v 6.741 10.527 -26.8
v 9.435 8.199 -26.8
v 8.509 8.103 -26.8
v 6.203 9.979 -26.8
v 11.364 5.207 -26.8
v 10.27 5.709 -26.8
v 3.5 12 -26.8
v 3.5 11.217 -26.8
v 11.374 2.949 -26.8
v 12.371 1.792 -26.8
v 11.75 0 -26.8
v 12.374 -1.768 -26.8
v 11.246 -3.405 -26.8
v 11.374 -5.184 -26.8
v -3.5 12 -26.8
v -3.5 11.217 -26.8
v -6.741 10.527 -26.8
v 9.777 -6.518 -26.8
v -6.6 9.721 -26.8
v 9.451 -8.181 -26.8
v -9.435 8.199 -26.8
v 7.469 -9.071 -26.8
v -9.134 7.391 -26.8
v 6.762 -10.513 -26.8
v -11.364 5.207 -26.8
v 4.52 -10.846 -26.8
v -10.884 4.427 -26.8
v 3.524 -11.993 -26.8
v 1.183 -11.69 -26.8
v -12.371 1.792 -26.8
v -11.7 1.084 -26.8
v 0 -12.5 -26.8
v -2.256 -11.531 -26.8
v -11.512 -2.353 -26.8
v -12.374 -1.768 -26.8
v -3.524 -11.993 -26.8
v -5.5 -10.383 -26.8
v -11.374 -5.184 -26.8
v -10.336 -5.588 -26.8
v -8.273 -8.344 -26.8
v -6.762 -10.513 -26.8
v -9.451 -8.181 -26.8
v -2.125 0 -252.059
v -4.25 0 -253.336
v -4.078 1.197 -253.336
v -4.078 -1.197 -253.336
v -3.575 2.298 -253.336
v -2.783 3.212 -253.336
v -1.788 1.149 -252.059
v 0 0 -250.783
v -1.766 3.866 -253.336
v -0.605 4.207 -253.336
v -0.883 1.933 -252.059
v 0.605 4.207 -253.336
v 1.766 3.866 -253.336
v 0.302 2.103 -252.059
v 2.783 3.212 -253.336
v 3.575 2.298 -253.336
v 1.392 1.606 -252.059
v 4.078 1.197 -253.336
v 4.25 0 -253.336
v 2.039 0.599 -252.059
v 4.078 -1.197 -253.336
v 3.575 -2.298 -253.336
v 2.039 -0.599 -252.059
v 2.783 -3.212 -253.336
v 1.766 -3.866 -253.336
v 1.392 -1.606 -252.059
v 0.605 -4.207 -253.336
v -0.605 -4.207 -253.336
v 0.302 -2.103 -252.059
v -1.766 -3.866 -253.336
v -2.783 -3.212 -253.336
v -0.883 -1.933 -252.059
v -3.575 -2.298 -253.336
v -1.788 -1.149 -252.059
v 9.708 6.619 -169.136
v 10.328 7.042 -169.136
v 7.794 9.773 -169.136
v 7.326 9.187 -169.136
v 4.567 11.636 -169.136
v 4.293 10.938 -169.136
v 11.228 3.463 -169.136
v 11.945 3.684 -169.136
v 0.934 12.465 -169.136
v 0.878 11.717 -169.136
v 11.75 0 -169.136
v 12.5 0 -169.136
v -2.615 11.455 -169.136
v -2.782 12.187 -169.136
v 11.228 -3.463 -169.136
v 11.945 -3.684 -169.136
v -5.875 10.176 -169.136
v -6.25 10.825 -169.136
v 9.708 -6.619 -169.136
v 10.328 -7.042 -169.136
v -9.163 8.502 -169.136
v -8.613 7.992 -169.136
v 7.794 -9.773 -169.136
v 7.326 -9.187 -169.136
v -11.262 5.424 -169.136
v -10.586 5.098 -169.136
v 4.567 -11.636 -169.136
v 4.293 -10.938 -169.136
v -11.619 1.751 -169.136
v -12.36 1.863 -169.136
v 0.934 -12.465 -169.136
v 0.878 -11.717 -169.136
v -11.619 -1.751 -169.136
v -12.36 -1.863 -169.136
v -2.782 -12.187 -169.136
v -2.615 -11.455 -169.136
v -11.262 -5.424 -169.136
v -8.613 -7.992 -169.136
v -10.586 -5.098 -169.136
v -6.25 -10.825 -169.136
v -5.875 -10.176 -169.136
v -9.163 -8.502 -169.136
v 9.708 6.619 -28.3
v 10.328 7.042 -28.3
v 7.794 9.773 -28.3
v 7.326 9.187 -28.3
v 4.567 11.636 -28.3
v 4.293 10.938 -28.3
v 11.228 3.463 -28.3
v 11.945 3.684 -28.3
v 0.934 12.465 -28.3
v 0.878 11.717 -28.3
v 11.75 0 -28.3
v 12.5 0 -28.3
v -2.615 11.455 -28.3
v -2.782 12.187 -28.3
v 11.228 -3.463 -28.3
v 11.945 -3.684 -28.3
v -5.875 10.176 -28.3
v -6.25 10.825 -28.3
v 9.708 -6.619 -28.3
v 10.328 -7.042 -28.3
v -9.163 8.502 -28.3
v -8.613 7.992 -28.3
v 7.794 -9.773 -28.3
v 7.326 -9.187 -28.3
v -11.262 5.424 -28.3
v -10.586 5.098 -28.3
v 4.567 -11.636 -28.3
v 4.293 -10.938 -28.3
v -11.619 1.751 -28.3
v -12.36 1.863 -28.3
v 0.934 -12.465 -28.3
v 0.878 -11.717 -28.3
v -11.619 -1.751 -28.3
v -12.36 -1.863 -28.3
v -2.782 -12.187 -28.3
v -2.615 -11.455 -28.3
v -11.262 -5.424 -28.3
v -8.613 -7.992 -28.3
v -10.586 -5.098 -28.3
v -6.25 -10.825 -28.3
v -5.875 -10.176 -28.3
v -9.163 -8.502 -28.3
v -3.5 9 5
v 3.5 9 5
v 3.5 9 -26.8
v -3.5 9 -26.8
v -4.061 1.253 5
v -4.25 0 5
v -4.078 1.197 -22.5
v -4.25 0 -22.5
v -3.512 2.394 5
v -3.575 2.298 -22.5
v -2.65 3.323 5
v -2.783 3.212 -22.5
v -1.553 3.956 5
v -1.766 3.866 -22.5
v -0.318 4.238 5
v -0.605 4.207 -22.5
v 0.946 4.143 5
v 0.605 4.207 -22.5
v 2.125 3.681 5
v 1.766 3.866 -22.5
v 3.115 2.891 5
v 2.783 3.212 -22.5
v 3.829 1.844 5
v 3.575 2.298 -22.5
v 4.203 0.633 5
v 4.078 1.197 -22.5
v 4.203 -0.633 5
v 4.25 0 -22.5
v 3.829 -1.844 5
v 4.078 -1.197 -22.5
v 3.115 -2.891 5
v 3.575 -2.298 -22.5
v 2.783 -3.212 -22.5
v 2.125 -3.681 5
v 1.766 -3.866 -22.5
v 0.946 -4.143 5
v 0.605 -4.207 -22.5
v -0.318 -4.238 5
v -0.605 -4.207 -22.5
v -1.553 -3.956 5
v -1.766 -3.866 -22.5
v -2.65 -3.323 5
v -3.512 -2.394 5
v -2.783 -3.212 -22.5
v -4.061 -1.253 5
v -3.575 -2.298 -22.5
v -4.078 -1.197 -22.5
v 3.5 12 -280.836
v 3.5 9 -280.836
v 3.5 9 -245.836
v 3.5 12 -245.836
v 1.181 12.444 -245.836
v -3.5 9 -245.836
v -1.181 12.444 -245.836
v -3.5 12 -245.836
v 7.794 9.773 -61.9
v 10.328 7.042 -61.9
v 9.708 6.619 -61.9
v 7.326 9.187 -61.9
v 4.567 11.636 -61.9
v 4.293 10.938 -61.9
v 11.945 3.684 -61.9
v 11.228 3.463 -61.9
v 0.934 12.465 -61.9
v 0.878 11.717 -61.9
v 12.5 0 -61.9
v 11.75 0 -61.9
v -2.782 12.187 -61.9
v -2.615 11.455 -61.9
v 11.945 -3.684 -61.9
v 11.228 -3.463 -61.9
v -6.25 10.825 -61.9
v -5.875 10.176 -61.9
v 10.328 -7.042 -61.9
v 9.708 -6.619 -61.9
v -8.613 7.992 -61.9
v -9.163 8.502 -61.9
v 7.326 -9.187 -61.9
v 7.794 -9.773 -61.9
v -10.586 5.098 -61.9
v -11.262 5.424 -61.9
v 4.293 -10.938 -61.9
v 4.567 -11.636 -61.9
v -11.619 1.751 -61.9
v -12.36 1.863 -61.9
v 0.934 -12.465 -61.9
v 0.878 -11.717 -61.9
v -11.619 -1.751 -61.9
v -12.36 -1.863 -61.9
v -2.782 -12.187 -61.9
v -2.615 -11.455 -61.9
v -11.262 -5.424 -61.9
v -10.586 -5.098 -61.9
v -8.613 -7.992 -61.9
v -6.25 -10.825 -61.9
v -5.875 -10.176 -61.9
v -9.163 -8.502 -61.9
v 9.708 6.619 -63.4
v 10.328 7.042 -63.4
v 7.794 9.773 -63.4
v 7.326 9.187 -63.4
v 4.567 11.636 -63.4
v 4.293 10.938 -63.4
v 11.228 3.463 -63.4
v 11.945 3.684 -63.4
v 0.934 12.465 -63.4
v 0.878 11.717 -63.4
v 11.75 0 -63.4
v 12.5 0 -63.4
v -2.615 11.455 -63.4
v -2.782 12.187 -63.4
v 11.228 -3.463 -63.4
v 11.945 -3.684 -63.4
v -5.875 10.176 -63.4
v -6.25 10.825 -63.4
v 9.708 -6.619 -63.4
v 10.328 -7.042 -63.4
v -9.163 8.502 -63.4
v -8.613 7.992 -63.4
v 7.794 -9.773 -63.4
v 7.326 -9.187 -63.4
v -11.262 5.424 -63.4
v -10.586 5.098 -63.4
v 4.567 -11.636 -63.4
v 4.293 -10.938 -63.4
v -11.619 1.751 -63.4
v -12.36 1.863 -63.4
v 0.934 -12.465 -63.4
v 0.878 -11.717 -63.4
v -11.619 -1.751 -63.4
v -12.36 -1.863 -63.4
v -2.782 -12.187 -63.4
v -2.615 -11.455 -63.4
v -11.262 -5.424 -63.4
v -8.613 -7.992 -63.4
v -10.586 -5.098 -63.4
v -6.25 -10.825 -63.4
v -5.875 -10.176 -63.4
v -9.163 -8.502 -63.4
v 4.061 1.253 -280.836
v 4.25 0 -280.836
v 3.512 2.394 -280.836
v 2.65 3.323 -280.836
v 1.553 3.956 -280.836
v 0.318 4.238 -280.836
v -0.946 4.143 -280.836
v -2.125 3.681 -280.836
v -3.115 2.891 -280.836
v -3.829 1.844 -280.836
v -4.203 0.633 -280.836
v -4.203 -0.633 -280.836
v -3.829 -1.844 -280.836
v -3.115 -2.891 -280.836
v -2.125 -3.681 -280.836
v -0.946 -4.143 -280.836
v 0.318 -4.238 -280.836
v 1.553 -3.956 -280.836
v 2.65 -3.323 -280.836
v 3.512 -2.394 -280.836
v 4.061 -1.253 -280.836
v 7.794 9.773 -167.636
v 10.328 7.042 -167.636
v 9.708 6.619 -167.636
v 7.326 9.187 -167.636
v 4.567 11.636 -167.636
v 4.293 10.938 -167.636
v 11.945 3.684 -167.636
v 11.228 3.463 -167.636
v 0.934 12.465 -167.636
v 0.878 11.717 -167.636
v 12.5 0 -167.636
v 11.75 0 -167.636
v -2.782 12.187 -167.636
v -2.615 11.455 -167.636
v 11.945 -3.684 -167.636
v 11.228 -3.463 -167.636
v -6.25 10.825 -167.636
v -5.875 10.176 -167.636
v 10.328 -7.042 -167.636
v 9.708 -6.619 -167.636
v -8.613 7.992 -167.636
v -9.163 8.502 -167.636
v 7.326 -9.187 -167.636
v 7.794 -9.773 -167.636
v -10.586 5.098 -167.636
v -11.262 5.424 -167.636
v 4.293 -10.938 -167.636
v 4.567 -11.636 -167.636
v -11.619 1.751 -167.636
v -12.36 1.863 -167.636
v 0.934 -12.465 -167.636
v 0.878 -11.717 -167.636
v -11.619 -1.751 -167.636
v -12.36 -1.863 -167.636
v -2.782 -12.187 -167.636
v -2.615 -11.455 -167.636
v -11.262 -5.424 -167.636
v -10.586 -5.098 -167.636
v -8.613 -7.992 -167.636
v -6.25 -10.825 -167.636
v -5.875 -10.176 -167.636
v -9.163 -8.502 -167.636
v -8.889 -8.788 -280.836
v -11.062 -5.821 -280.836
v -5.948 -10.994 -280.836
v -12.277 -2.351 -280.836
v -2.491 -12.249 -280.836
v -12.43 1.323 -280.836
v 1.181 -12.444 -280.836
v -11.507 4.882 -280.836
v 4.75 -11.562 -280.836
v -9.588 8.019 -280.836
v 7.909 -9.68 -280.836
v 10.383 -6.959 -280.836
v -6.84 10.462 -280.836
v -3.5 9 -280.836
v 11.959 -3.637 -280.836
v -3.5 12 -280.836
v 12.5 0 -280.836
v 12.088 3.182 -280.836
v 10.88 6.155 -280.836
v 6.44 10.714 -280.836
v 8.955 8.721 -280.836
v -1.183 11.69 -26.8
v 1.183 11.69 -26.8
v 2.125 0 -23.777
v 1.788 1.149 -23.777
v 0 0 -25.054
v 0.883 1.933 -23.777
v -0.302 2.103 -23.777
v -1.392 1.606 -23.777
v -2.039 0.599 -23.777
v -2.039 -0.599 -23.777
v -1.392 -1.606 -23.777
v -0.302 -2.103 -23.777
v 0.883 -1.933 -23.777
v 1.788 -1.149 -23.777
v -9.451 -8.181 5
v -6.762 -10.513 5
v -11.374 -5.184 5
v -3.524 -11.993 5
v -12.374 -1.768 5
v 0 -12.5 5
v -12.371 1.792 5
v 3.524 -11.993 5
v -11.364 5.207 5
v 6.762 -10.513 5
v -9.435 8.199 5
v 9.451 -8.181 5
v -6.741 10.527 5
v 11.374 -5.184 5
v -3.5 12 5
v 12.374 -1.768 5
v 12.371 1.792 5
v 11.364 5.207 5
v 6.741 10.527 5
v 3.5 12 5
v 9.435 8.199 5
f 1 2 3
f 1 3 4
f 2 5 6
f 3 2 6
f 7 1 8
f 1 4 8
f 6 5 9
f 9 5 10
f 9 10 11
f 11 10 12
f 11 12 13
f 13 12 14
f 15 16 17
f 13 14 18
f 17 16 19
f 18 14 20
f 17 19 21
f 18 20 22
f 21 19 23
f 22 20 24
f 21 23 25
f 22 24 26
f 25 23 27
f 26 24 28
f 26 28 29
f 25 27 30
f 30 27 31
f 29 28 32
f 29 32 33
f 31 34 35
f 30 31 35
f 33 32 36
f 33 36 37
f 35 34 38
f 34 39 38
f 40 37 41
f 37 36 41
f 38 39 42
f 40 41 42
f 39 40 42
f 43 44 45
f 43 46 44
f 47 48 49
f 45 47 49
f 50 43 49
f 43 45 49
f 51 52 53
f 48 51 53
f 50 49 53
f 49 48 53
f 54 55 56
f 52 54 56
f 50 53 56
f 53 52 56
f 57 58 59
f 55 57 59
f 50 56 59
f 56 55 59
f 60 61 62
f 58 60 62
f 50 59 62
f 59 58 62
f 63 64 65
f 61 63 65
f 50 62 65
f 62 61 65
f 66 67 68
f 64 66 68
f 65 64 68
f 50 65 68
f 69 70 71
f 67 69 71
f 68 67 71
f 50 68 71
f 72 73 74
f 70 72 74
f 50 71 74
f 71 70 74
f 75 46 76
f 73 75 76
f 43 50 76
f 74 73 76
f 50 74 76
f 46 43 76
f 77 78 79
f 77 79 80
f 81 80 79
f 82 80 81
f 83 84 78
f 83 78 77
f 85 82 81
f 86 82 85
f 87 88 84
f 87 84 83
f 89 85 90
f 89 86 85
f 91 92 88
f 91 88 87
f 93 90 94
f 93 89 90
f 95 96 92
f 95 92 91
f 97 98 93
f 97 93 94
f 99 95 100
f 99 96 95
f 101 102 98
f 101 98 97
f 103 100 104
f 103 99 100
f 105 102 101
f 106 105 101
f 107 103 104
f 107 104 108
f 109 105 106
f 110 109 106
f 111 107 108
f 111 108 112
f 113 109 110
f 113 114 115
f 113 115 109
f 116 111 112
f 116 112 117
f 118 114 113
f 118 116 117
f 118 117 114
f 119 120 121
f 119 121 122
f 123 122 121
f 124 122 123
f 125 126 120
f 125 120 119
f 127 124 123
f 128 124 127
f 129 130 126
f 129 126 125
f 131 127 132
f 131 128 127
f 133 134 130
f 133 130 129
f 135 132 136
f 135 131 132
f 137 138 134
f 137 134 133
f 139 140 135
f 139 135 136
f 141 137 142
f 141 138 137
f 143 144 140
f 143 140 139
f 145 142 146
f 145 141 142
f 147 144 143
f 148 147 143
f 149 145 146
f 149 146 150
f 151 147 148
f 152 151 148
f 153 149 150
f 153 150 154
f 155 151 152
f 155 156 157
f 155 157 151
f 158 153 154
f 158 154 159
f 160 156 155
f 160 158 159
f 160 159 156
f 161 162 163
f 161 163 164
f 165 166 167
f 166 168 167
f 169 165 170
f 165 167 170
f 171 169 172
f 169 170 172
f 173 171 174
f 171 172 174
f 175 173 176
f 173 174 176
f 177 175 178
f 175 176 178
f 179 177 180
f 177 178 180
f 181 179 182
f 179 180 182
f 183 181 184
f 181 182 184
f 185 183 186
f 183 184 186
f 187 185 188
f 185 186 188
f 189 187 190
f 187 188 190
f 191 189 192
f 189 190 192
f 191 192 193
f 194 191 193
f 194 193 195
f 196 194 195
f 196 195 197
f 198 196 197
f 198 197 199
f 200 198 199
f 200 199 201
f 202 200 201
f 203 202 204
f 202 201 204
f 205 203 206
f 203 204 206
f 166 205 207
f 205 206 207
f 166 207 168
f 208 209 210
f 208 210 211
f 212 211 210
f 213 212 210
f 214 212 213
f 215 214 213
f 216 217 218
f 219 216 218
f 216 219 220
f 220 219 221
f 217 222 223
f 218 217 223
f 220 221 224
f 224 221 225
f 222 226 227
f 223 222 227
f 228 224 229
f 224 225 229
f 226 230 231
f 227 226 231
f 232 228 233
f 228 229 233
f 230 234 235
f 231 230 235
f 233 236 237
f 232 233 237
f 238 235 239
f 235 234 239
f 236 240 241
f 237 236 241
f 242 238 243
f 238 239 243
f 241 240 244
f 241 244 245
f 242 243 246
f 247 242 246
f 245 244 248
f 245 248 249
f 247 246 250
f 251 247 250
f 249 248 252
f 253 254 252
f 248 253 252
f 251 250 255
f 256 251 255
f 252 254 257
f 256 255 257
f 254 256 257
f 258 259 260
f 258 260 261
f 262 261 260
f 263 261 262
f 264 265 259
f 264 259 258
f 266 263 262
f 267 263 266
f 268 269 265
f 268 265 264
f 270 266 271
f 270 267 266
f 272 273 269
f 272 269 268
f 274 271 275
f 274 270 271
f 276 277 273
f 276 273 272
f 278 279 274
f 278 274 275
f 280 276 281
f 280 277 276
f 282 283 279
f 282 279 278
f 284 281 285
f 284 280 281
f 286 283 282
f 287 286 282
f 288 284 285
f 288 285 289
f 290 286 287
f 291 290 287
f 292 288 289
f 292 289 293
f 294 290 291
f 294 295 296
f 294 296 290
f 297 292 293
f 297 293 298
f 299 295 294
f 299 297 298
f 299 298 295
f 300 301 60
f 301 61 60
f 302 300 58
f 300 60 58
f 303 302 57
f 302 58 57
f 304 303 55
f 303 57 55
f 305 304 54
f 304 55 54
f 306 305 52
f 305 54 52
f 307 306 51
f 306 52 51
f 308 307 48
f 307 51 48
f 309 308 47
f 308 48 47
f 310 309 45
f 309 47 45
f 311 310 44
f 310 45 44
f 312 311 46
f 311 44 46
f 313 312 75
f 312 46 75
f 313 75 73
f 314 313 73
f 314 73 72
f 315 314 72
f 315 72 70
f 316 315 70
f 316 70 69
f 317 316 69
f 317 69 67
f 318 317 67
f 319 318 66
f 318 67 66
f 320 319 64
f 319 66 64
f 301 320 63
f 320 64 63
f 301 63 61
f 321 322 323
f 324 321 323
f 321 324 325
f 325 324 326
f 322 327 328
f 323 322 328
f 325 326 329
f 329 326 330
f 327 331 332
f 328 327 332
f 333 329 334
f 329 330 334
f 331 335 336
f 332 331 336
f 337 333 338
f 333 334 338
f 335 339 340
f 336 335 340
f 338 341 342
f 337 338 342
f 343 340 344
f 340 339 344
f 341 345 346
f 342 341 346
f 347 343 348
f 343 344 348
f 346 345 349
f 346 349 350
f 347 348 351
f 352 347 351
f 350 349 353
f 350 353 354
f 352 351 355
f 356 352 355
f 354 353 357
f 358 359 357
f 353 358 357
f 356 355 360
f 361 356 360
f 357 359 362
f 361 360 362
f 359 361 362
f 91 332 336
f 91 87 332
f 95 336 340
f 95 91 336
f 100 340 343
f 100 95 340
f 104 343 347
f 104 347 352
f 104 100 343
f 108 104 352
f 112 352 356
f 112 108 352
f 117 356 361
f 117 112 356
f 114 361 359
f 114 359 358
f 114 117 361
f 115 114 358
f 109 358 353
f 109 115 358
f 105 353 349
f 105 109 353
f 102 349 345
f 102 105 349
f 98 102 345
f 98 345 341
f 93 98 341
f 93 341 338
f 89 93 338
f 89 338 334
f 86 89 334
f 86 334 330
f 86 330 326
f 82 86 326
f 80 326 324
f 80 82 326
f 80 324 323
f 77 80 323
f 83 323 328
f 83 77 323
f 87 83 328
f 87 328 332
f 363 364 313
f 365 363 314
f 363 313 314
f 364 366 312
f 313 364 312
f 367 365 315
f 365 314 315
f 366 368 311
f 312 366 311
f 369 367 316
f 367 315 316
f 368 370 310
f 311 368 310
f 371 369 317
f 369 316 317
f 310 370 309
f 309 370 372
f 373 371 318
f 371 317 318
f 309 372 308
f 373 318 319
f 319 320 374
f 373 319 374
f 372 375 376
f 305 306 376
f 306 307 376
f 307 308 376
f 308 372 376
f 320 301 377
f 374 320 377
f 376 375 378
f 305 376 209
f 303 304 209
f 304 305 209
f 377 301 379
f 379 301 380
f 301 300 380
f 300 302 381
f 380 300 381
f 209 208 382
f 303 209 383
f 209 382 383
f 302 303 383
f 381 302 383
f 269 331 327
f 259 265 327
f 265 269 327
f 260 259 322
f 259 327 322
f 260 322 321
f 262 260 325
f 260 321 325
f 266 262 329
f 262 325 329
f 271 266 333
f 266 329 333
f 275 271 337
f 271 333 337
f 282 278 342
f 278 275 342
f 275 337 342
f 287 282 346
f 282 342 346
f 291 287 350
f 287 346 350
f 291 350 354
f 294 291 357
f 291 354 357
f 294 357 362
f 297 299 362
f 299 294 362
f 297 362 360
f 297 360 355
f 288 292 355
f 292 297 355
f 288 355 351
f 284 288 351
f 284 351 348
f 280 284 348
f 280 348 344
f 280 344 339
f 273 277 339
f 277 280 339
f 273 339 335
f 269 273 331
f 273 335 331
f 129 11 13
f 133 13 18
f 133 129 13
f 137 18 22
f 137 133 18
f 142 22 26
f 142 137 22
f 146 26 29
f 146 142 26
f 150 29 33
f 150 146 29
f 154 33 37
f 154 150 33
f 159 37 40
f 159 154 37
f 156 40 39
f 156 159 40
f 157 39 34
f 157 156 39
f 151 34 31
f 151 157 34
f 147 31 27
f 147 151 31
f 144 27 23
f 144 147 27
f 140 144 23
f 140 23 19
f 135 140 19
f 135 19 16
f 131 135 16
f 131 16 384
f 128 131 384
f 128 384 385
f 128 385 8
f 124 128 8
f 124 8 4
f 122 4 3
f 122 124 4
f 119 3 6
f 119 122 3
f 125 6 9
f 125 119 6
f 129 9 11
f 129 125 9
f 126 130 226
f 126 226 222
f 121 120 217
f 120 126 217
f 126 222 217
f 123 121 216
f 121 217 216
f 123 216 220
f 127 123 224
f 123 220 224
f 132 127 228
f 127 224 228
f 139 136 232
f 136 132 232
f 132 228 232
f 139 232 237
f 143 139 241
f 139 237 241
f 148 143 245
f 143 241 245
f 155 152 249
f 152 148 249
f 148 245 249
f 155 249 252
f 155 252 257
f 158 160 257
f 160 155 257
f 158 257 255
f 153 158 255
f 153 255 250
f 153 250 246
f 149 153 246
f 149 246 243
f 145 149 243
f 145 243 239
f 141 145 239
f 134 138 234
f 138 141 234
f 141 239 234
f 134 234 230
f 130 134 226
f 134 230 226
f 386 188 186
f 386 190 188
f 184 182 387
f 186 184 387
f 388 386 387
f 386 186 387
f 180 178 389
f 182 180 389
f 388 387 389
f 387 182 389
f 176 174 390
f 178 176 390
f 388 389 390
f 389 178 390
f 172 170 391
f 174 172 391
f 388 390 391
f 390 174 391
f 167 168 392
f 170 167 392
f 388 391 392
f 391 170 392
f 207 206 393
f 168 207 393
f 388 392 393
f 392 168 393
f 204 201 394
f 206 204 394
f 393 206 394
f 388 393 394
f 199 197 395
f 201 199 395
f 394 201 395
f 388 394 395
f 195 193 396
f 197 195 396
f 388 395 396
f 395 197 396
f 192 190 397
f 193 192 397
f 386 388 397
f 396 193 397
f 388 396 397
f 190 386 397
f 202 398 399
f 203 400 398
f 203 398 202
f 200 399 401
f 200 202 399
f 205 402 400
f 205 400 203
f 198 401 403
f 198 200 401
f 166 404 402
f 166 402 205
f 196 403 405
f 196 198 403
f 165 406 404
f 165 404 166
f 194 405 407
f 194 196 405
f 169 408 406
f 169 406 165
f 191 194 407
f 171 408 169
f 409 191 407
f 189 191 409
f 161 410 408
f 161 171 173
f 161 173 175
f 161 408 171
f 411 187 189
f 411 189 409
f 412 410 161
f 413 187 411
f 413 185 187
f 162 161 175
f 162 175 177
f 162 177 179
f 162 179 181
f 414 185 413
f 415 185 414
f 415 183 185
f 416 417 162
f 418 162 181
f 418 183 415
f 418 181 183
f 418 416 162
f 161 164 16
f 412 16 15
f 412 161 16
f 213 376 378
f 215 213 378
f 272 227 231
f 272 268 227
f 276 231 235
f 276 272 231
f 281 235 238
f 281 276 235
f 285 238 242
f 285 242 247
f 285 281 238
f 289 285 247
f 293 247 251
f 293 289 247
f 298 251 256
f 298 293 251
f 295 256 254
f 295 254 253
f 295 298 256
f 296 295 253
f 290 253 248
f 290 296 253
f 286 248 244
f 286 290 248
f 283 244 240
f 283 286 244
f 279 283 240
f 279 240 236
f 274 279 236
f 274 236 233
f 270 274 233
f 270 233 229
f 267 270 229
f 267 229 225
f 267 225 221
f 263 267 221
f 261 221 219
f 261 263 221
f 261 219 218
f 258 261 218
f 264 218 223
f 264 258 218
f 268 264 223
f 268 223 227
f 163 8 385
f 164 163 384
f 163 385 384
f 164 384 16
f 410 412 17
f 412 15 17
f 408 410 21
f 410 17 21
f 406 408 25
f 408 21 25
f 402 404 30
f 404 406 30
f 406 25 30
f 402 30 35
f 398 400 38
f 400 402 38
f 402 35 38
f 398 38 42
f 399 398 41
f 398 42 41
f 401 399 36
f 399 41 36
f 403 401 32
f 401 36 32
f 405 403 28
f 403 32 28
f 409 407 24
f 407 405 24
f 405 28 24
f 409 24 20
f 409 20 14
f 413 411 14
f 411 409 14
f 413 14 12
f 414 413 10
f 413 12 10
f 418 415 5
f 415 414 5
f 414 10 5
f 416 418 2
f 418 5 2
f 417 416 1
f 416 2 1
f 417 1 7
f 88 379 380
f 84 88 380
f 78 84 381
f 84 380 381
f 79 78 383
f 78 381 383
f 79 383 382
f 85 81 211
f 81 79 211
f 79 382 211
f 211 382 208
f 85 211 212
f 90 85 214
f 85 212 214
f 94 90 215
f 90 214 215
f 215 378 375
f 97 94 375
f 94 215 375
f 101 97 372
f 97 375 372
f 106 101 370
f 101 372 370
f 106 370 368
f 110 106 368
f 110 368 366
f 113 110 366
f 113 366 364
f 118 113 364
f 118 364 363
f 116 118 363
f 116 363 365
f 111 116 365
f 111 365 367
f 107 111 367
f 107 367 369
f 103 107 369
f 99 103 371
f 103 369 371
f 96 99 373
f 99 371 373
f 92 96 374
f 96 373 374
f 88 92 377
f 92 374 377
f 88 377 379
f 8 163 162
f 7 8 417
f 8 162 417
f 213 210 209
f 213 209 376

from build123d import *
from OCP.BRepAlgoAPI import BRepAlgoAPI_Cut
from OCP.TopTools import TopTools_ListOfShape

# Parameters (mm, degrees)
EXTRUDE_1_DEPTH        = 5
EXTRUDE_1_DEPTH_BACK   = 280.836309
SKETCH_1_R             = 12.5
HOLE_WIZARD_M101_D     = 8.5
HOLE_WIZARD_M101_DEPTH = 27.5
HOLE_WIZARD_M101_TIP   = 2.553657631
SKETCH_6_W             = 7
SKETCH_6_H             = 7
CUT_EXTRUDE_1_DEPTH    = 35
SKETCH_7_W             = 1.5
SKETCH_7_H             = 2.75
CUT_EXTRUDE_START      = -285.836309
SKETCH_6_2_W           = 7
SKETCH_6_2_H           = 7
CUT_EXTRUDE_2_DEPTH    = 31.8
HOLE_WIZARD_M102_D     = 8.5
HOLE_WIZARD_M102_DEPTH = 27.5
HOLE_WIZARD_M102_TIP   = 2.553657631


with BuildPart() as part:
    # Эскиз1 → Бобышка-Вытянуть1 (new, two sides: drawn at the far end of the back side and taken through both)
    with BuildSketch(Plane.XY.offset(-EXTRUDE_1_DEPTH_BACK)):
        Circle(SKETCH_1_R)
    extrude(amount=EXTRUDE_1_DEPTH + EXTRUDE_1_DEPTH_BACK)

    # Отверстие обработанное метчиком M101
    with Locations(Plane(origin=(0, 0, -280.836309448), x_dir=(-1, 0, 0), z_dir=(0, 0, -1))):
        with Locations((0, 0)):
            Hole(HOLE_WIZARD_M101_D / 2, depth=HOLE_WIZARD_M101_DEPTH)
            with Locations((0, 0, -(HOLE_WIZARD_M101_DEPTH + HOLE_WIZARD_M101_TIP / 2))):  # 118° drill point
                Cone(0, HOLE_WIZARD_M101_D / 2, HOLE_WIZARD_M101_TIP, mode=Mode.SUBTRACT)

    # Эскиз6 → Вырез-Вытянуть1 (cut)
    with BuildSketch(Plane(origin=(0, 0, -280.836309448), x_dir=(-1, 0, 0), z_dir=(0, 0, -1))):
        with Locations((0, 12.5)):
            Rectangle(SKETCH_6_W, SKETCH_6_H)
    extrude(amount=-CUT_EXTRUDE_1_DEPTH, mode=Mode.SUBTRACT)

    # Эскиз7 → Вырез-Повернуть1 (revolve, cut)
    with BuildSketch(Plane(origin=(0, 0, 0), x_dir=(0, 0, -1), z_dir=(1, 0, 0)), mode=Mode.PRIVATE) as cut_revolve_1_sk:
        with Locations((62.65, 13.125)):
            Rectangle(SKETCH_7_W, SKETCH_7_H)
        with Locations((27.55, 13.125)):
            Rectangle(SKETCH_7_W, SKETCH_7_H)
        with Locations((168.386309448, 13.125)):
            Rectangle(SKETCH_7_W, SKETCH_7_H)
    revolve(cut_revolve_1_sk.sketch.rotate(Axis((0, 0, 1000), (0, 0, -1)), 90), axis=Axis((0, 0, 1000), (0, 0, -1)), mode=Mode.SUBTRACT)


with BuildPart() as cut_extrude_2_tool:
    # Эскиз6<2> → Вырез-Вытянуть2 (new body)
    with BuildSketch(Plane(origin=(0, 0, -280.836309448), x_dir=(-1, 0, 0), z_dir=(0, 0, -1)).offset(CUT_EXTRUDE_START)):
        with Locations((0, 12.5)):
            Rectangle(SKETCH_6_2_W, SKETCH_6_2_H)
    extrude(amount=CUT_EXTRUDE_2_DEPTH)


with BuildPart() as part_1:
    add(part.part)

    # Вырез-Вытянуть2: cut by cut_extrude_2_tool, with a tolerance
    cut_extrude_2_stock = TopTools_ListOfShape()
    cut_extrude_2_stock.Append(part_1.part.wrapped)
    cut_extrude_2_tools = TopTools_ListOfShape()
    cut_extrude_2_tools.Append(cut_extrude_2_tool.part.wrapped)
    cut_extrude_2_cut = BRepAlgoAPI_Cut()
    cut_extrude_2_cut.SetArguments(cut_extrude_2_stock)
    cut_extrude_2_cut.SetTools(cut_extrude_2_tools)
    cut_extrude_2_cut.SetFuzzyValue(0.00001)
    cut_extrude_2_cut.Build()
    add(Compound.cast(cut_extrude_2_cut.Shape()).solids(), mode=Mode.REPLACE)

    # Отверстие обработанное метчиком M102
    with Locations(Plane.XY.offset(5)):
        with Locations((0, 0)):
            Hole(HOLE_WIZARD_M102_D / 2, depth=HOLE_WIZARD_M102_DEPTH)
            with Locations((0, 0, -(HOLE_WIZARD_M102_DEPTH + HOLE_WIZARD_M102_TIP / 2))):  # 118° drill point
                Cone(0, HOLE_WIZARD_M102_D / 2, HOLE_WIZARD_M102_TIP, mode=Mode.SUBTRACT)


solid = part_1.part
